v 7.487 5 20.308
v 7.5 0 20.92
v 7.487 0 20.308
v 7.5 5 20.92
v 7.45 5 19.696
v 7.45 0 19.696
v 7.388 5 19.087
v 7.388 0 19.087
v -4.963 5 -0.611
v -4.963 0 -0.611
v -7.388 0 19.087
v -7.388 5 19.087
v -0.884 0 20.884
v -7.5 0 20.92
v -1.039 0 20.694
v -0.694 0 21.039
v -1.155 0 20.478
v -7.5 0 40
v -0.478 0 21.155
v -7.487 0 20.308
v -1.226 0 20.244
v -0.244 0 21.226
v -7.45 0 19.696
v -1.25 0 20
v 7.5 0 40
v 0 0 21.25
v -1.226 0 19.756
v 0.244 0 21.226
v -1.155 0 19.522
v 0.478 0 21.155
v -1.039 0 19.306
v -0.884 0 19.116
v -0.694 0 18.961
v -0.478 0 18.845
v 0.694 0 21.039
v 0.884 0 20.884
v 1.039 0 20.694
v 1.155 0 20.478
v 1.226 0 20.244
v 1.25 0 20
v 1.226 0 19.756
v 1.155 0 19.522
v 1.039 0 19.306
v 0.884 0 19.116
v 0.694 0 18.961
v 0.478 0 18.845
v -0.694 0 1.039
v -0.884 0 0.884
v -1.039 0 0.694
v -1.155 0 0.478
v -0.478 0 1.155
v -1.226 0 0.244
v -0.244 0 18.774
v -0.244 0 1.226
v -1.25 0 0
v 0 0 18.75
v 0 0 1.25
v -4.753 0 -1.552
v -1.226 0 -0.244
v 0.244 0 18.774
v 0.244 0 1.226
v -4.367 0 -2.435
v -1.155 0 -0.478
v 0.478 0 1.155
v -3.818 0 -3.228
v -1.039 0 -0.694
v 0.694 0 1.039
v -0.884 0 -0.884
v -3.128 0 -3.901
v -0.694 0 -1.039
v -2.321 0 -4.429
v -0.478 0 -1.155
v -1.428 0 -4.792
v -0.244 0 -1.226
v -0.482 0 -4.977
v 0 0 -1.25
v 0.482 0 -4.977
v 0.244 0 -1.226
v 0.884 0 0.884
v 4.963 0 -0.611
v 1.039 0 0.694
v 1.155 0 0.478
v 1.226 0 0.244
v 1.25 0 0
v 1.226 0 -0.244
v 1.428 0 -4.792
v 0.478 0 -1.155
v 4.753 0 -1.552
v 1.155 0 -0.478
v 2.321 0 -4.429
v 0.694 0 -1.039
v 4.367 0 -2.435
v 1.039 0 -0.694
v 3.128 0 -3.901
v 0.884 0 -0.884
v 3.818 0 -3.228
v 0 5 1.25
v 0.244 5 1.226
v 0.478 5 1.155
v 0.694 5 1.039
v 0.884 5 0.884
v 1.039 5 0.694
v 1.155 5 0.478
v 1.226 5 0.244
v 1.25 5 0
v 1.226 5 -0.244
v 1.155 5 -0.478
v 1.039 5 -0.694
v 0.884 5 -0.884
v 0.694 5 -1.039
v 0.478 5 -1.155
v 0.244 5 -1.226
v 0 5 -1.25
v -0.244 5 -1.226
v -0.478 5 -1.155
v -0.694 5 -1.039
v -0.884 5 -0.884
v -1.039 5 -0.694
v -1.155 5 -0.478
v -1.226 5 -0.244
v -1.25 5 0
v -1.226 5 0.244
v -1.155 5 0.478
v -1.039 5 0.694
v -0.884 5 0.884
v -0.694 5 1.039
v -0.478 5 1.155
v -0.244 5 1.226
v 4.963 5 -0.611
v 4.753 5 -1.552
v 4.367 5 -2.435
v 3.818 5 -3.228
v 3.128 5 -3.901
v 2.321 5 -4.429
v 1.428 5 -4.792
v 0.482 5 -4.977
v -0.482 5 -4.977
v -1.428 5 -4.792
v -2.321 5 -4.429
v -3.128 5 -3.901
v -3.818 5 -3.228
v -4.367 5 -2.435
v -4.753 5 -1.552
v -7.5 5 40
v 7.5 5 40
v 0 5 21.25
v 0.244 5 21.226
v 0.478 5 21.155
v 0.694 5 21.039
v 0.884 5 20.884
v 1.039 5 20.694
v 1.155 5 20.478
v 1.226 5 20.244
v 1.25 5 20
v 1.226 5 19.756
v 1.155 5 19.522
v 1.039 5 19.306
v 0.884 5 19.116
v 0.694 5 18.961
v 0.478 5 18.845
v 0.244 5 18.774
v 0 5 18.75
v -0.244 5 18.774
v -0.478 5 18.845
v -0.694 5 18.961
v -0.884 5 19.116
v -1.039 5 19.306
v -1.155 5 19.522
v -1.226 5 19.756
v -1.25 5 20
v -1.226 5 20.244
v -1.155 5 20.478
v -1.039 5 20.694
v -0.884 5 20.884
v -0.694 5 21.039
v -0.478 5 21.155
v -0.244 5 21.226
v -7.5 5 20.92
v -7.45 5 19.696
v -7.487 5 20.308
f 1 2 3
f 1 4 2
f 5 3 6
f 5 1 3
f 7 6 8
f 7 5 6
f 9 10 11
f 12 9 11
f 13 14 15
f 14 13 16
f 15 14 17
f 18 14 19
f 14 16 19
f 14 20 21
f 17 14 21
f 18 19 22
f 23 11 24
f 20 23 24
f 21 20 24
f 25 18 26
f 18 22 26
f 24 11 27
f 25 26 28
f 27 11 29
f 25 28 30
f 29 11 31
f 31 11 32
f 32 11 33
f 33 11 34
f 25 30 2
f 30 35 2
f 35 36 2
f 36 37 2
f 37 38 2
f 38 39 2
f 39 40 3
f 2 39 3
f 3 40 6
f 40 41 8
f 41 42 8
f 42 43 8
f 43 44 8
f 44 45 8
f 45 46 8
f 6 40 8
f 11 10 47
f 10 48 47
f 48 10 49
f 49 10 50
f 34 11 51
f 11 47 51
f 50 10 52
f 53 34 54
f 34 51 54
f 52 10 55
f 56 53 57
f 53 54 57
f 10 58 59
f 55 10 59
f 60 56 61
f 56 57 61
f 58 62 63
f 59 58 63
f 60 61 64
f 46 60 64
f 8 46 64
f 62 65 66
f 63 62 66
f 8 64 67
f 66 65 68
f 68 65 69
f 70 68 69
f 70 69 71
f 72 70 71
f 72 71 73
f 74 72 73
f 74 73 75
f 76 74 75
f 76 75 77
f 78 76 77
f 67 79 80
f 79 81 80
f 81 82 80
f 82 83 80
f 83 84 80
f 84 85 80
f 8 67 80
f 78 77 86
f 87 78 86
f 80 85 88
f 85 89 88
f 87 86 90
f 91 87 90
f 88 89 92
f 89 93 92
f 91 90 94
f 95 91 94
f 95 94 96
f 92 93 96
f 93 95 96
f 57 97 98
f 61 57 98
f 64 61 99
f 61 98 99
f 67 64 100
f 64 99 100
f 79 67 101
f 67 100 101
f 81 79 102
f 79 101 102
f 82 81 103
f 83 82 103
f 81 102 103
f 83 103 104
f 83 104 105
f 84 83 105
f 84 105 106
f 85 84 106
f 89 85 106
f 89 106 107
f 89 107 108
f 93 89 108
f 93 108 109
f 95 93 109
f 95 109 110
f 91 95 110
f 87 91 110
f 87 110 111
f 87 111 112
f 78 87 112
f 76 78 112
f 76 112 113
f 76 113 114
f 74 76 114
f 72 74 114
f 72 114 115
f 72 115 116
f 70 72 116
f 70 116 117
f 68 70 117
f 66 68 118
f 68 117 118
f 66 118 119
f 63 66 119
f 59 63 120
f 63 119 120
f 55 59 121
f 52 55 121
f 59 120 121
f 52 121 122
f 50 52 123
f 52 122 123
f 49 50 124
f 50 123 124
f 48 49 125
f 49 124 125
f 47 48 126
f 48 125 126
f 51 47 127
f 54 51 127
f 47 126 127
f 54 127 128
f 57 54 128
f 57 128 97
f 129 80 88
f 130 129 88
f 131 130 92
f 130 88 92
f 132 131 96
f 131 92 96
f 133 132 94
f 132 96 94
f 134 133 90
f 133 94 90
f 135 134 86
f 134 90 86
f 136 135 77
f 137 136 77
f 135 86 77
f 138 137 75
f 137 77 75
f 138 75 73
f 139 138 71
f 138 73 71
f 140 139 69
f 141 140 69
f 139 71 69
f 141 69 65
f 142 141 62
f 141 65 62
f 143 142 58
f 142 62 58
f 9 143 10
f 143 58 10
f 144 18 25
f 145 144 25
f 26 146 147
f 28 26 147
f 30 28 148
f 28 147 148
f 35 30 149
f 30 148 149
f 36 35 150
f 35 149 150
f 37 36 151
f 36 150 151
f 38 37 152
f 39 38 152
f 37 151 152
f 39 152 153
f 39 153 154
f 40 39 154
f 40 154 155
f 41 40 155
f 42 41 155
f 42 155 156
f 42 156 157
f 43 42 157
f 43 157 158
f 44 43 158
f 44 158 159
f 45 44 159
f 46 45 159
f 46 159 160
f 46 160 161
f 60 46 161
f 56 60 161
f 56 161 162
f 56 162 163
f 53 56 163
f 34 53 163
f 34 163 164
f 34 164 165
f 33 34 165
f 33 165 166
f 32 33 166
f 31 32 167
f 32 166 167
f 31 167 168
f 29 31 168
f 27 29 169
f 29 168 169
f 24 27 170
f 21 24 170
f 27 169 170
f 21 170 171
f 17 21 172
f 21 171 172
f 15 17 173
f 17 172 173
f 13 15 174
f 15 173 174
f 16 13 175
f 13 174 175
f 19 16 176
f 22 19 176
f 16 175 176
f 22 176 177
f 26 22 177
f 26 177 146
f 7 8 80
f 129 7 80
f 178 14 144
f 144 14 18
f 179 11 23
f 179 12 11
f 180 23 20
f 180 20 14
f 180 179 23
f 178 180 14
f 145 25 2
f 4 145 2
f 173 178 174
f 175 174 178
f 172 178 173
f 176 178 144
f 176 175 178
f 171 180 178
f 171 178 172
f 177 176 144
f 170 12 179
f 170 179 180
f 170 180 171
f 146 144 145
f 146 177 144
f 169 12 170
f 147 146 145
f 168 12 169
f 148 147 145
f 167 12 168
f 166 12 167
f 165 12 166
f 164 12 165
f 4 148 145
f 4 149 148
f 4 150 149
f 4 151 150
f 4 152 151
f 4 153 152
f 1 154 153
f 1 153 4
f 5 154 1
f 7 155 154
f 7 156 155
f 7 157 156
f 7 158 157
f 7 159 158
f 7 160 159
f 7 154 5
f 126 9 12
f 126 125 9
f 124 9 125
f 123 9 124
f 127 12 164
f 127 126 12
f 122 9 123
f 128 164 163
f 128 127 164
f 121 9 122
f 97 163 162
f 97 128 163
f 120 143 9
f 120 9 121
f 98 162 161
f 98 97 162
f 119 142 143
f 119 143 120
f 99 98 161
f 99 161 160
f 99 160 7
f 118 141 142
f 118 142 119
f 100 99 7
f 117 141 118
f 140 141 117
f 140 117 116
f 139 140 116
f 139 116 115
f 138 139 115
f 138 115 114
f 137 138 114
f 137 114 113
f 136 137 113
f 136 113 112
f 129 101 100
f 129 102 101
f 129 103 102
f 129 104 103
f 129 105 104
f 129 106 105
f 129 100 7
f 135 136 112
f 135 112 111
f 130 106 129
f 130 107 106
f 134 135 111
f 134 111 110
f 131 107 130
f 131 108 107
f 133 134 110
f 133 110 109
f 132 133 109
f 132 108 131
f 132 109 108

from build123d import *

# Parameters (mm, degrees)
SKETCH1_R           = 5
BOSS_EXTRUDE1_DEPTH = 5
FILLET1_R           = 15
SKETCH2_R           = 1.25
CUT_EXTRUDE1_DEPTH  = 42.003048667


with BuildPart() as part:
    # Sketch1 → Boss-Extrude1 (new body)
    with BuildSketch(Plane(origin=(0, 0, 0), x_dir=(1, 0, 0), z_dir=(0, 1, 0))):
        with BuildLine():
            ThreePointArc((5, 0), (-0.30604892, -4.990624616), (-4.962533624, 0.610950109))
            Line((-4.962533624, 0.610950109), (-7.5, -20))
            Line((-7.5, -20), (-7.5, -40))
            Line((-7.5, -40), (7.5, -40))
            Line((7.5, -40), (7.5, -20))
            Line((7.5, -20), (4.962533624, 0.610950109))
            ThreePointArc((4.962533624, 0.610950109), (4.990624616, 0.30604892), (5, 0))
        make_face()
        Circle(SKETCH1_R)
    extrude(amount=BOSS_EXTRUDE1_DEPTH)

    # Fillet1
    fillet1_edges = [part.edges().sort_by_distance(p)[0] for p in [
        (7.5, 2.5, 20),
        (-7.5, 2.5, 20),
    ]]
    fillet(fillet1_edges, radius=FILLET1_R)

    # Sketch2 → Cut-Extrude1 (cut, through all)
    with BuildSketch(Plane(origin=(0, 5, 0), x_dir=(1, 0, 0), z_dir=(0, 1, 0))):
        with Locations(Location((0, 0, 0), (0, 0, 270))):
            Circle(SKETCH2_R)
        with Locations(Location((0, -20, 0), (0, 0, 270))):
            Circle(SKETCH2_R)
    extrude(amount=-CUT_EXTRUDE1_DEPTH, mode=Mode.SUBTRACT)


solid = part.part
